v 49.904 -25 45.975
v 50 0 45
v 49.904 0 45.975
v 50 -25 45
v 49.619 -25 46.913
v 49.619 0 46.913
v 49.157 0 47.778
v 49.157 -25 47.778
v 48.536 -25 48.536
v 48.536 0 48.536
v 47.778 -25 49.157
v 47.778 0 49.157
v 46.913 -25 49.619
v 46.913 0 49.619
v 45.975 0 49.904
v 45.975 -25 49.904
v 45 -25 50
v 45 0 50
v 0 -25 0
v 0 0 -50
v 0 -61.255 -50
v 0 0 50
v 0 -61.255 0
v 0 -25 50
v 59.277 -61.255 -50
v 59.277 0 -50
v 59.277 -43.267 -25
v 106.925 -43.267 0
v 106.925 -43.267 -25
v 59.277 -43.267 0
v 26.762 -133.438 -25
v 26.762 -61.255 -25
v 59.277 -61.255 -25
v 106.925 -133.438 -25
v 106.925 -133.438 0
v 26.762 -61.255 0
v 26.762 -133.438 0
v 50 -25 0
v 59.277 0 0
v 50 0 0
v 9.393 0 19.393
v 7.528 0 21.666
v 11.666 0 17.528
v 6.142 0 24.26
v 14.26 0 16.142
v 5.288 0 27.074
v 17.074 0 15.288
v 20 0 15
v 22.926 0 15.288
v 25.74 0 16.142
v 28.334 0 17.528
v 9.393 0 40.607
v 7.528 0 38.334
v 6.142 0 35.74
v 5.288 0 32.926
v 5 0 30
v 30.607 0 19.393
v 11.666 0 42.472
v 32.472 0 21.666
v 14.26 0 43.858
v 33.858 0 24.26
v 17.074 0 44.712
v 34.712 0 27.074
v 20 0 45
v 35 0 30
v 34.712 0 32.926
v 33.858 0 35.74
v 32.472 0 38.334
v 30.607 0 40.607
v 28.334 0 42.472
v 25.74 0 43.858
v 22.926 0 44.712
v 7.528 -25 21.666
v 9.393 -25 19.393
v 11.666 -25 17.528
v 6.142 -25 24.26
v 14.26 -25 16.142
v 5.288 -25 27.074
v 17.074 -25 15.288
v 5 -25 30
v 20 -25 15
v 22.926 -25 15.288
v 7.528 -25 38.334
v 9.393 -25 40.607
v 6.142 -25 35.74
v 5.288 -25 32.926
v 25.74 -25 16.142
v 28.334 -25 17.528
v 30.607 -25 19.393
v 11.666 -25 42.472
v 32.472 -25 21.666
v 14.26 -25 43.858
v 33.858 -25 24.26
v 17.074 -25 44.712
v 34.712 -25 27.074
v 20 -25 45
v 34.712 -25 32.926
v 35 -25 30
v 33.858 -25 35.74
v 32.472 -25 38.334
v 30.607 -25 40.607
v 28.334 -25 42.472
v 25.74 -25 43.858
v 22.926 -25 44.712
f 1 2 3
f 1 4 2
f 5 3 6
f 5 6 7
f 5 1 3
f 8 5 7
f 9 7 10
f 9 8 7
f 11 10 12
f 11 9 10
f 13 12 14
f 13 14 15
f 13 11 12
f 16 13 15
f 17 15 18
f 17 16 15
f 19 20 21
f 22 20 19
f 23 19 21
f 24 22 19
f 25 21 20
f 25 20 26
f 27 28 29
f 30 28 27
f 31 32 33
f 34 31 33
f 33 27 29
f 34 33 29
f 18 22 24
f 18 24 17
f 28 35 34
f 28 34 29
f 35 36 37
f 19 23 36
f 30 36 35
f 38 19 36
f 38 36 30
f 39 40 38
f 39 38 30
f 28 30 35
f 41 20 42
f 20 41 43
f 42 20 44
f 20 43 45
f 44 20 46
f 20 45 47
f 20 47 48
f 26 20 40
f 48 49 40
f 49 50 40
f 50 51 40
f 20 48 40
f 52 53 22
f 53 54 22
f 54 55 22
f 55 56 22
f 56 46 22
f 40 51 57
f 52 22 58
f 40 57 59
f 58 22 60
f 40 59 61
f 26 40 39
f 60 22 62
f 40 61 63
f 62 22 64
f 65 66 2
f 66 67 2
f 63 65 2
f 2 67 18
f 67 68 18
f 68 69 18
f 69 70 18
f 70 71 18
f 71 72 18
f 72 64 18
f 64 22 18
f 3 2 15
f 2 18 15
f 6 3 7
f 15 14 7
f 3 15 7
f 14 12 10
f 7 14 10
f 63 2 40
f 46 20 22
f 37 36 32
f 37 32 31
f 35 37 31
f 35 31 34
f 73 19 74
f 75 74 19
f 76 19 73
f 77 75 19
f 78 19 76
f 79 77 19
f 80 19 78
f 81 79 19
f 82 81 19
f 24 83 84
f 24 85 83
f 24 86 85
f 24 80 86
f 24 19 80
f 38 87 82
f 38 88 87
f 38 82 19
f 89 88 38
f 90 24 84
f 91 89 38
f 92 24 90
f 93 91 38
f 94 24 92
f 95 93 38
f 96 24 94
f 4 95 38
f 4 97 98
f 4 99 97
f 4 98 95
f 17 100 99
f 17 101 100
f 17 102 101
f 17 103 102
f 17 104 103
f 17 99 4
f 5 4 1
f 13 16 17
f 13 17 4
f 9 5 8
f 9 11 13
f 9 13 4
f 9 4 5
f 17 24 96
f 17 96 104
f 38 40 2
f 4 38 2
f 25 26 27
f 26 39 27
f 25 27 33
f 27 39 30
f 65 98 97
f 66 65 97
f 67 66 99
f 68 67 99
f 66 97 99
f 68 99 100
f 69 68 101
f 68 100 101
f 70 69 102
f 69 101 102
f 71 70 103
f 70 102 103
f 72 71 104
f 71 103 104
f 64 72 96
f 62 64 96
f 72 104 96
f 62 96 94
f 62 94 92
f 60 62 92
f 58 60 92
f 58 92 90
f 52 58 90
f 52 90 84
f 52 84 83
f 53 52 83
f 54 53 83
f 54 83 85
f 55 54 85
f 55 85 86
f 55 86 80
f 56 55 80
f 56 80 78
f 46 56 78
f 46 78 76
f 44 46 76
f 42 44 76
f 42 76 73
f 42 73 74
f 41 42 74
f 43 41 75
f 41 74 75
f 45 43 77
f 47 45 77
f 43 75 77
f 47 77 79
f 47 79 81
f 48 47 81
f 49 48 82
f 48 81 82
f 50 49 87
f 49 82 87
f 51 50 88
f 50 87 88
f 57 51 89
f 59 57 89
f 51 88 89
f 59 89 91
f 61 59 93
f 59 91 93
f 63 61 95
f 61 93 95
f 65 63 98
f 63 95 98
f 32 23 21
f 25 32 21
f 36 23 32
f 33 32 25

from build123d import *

# Parameters (mm, degrees)
F0_W       = 50
F0_H       = 50
F1_DEPTH   = 25
F2_R       = 5
F3_R       = 15
F4_DEPTH   = 25.001
F5_W       = 59.2767745256
F5_H       = 61.2553304527
F6_DEPTH   = 25
F6_FACE1_W = 59.2767745256
F6_FACE1_H = 61.2553304527
F7_W       = 7.189117372
F7_H       = 74.1506516933
F8_DEPTH   = 25


with BuildPart() as f1:
    # F0 (on Front) → F1 (new body)
    with BuildSketch(Plane.XZ):
        with Locations((25, 25)):
            Rectangle(F0_W, F0_H)
    extrude(amount=F1_DEPTH)

    # F2
    f2_edges = [f1.edges().sort_by_distance(p)[0] for p in [
        (50, -12.5, 50),
    ]]
    fillet(f2_edges, radius=F2_R)

    # F3 (on face) → F4 (cut, through all)
    with BuildSketch(Plane.XZ.offset(25)):
        with Locations((20, 30)):
            Circle(F3_R)
    extrude(amount=-F4_DEPTH, mode=Mode.SUBTRACT)

    # F5 (on Top) → F6 (join)
    with BuildSketch(Plane.XY):
        with Locations((29.6383872628, -30.6276652263)):
            Rectangle(F5_W, F5_H)
    extrude(amount=-F6_DEPTH)

    # F6_face1 (on face) + F7 (on face) → F8 (join)
    with BuildSketch(Plane(origin=(29.6383872628, -30.6276652263, -25), x_dir=(1, 0, 0), z_dir=(0, 0, -1))):
        Rectangle(F6_FACE1_W, F6_FACE1_H)
    with BuildSketch(Plane.XY):
        Polygon((59.2767745256, -61.2553304527), (38.7707948685, -61.2553304527), (36.2086445093, -61.2553304527), (26.7624184489, -61.2553304527), (26.7624184489, -133.4375590086), (106.9246456027, -133.4375590086), (106.9246456027, -43.2669967413), (59.2767745256, -43.2669967413), align=None)
        with Locations((79.3372057378, -86.4168554544)):
            Rectangle(F7_W, F7_H, mode=Mode.SUBTRACT)
        with Locations((79.3372057378, -86.4168554544)):
            Rectangle(F7_W, F7_H)
    extrude(amount=F8_DEPTH, dir=(0, 0, -1))


solid = f1.part
